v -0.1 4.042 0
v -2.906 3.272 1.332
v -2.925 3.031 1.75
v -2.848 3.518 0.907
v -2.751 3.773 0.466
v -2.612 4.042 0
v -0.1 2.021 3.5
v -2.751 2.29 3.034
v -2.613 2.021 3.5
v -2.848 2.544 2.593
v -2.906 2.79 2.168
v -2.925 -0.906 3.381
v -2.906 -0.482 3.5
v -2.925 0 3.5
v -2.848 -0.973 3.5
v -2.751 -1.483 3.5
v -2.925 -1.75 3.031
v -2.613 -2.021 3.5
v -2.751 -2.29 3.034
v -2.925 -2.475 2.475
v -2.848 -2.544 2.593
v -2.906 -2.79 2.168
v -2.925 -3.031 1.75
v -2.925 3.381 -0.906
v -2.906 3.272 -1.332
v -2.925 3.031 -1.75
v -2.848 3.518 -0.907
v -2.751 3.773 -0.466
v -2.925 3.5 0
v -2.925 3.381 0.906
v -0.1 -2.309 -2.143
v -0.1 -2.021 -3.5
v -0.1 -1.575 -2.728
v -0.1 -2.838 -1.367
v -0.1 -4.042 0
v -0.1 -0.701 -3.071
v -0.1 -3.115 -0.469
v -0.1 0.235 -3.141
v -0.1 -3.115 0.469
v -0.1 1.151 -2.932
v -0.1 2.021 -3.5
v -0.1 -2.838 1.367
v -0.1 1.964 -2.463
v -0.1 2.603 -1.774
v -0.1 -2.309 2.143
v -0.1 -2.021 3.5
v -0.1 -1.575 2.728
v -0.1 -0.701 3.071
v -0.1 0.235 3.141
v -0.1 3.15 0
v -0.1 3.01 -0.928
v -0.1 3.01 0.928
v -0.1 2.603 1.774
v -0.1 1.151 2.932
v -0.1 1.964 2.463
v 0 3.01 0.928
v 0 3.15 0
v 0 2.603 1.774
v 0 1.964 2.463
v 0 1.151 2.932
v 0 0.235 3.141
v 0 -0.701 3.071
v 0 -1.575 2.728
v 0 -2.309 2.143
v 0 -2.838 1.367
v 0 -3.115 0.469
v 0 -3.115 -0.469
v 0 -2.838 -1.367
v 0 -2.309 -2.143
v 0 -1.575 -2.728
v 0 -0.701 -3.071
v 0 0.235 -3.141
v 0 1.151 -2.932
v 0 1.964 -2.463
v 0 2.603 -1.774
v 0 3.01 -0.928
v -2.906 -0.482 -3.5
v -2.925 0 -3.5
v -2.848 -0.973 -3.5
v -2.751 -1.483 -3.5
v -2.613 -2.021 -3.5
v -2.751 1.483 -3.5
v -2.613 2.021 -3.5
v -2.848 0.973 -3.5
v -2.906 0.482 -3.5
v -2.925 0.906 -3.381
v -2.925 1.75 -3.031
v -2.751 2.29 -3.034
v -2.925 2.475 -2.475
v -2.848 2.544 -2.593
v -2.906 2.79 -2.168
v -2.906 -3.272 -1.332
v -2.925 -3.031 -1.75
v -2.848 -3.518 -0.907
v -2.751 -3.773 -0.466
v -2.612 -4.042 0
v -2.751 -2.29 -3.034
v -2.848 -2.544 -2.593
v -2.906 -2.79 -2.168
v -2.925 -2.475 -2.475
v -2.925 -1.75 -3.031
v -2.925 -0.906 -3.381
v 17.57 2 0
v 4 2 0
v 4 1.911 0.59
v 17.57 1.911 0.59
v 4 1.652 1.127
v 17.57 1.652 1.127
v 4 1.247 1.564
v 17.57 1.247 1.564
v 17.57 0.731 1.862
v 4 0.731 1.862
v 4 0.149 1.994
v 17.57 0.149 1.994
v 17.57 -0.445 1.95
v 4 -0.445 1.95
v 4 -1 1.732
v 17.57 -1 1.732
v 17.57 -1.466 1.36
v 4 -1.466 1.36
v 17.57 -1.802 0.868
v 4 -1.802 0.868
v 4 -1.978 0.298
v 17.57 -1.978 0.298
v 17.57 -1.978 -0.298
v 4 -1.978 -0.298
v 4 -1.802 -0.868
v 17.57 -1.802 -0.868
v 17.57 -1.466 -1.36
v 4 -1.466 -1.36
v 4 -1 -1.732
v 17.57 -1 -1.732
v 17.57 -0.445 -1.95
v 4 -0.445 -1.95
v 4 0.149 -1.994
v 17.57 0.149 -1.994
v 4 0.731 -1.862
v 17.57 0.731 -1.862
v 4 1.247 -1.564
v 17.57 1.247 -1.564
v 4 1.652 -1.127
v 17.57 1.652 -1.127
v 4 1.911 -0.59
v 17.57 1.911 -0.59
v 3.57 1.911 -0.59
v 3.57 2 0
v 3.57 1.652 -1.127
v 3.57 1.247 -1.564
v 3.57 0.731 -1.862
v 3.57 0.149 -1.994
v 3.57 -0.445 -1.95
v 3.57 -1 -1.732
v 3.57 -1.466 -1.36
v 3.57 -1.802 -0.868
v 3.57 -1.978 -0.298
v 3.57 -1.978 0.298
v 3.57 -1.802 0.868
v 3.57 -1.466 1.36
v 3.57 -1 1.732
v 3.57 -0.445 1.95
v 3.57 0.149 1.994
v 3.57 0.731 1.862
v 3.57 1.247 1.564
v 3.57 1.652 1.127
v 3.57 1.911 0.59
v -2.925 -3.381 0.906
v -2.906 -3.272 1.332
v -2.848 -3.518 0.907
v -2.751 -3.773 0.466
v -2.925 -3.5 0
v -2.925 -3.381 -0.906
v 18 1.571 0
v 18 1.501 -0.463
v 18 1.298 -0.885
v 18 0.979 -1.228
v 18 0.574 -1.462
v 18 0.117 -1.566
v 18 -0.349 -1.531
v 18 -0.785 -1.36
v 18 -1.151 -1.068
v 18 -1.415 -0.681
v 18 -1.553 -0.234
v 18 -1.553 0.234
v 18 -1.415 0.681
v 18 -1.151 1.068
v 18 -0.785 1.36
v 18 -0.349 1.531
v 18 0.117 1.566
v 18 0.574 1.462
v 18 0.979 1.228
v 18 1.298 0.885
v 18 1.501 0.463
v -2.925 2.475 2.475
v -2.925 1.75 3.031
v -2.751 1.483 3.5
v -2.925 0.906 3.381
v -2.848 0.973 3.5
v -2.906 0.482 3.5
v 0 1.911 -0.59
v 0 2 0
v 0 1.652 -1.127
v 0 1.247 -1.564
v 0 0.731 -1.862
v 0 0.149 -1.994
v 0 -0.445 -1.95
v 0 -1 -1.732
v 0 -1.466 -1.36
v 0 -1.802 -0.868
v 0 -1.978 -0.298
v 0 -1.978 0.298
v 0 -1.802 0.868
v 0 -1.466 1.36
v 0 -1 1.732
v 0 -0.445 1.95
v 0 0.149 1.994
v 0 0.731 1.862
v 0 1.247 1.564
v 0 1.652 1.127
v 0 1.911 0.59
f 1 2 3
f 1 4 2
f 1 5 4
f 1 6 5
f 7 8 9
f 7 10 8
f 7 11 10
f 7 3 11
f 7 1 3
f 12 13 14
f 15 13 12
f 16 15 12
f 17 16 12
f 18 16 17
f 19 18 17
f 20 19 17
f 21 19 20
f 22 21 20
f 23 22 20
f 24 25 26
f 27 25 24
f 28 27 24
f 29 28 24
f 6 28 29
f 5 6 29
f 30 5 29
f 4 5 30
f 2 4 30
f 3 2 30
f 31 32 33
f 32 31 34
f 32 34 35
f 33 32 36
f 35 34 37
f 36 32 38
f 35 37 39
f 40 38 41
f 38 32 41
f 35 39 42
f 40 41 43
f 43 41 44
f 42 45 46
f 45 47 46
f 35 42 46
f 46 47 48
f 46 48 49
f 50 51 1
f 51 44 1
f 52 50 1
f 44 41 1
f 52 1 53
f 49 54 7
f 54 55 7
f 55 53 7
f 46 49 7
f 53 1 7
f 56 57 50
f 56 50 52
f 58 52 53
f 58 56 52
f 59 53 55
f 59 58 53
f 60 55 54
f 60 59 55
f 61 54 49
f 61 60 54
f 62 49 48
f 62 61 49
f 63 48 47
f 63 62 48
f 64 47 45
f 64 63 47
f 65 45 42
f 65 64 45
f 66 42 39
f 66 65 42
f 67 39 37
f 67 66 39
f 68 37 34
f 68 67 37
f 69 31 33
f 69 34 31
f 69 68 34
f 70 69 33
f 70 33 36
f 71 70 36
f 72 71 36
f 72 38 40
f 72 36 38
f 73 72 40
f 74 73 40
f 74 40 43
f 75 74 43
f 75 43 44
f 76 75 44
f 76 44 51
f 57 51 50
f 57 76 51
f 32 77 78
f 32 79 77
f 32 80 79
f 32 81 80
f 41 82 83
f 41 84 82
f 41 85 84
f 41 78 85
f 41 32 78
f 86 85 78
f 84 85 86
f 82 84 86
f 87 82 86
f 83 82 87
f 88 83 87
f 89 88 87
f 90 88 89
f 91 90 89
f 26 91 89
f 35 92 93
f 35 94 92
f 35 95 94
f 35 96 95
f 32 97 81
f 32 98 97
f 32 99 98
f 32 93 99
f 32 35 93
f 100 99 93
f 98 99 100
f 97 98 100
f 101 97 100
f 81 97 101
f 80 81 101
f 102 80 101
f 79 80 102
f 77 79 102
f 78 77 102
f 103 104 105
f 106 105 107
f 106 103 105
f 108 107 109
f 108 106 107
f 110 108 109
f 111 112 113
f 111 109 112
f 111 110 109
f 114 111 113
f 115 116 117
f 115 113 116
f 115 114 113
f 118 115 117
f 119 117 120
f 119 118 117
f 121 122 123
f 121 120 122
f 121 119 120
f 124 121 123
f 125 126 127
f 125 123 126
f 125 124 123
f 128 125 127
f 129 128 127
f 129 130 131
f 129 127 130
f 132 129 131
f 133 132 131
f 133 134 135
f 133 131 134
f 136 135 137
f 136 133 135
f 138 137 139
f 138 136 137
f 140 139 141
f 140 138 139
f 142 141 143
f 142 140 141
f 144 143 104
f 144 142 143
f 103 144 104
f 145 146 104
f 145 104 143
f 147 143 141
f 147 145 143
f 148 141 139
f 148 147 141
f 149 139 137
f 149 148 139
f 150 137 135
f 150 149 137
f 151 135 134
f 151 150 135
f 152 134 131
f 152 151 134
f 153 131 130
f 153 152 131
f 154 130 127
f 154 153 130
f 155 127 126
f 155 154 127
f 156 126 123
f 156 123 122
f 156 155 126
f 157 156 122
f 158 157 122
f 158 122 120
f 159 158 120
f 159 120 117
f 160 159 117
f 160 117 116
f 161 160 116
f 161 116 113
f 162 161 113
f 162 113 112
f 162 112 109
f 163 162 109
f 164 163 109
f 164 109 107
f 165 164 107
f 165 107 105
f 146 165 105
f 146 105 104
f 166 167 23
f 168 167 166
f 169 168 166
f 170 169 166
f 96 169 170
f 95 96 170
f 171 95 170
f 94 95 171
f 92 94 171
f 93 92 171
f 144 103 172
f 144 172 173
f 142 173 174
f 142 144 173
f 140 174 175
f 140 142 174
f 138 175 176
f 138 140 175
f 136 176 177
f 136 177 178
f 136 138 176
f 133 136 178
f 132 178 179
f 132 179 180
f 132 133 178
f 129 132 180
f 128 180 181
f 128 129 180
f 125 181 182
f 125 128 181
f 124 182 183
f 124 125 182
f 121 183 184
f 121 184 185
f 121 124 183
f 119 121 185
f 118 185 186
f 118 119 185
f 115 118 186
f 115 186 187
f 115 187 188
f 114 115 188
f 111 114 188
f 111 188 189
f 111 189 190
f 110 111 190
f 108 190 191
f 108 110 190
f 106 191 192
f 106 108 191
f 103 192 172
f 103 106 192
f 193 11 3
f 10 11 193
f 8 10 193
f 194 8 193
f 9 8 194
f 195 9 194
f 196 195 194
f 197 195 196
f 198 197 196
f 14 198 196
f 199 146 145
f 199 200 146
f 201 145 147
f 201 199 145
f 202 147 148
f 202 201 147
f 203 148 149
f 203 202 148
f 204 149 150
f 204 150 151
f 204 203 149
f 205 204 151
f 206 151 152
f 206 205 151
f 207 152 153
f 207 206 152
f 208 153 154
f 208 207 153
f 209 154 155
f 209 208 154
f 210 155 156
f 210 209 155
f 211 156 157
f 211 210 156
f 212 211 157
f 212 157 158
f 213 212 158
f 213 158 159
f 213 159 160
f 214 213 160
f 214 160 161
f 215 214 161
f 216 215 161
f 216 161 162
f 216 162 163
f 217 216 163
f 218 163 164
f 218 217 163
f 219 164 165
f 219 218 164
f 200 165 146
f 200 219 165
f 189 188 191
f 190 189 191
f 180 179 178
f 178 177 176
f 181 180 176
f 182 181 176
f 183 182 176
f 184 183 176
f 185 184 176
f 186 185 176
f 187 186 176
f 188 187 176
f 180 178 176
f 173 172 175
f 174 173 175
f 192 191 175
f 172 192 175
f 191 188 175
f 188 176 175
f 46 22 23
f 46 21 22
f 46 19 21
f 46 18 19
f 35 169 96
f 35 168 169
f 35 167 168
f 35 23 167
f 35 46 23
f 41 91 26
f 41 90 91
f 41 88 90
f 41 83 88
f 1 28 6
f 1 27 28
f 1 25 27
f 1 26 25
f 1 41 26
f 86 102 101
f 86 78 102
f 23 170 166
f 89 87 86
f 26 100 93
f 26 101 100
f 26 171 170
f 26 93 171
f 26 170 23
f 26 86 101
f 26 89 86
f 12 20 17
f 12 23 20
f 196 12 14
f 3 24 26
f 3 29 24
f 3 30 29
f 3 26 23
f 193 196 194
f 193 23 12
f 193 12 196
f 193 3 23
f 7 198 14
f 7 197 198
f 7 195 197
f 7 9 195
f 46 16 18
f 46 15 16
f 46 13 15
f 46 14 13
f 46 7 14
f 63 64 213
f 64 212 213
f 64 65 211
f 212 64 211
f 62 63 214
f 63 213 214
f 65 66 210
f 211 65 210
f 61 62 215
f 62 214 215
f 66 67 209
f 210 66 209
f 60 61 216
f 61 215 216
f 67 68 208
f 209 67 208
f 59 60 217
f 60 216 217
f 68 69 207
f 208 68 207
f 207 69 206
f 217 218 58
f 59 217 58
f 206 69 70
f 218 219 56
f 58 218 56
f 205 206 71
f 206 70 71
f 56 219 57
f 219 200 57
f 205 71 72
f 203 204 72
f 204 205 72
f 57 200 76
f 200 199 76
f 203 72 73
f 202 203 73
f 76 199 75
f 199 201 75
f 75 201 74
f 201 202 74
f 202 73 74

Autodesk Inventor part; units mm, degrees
ref_plane "YZ Plane" through (0, 0, 0) normal (1, 0, 0) x (0, 1, 0)
ref_plane "XZ Plane" through (0, 0, 0) normal (0, 1, 0) x (-1, 0, 0)
sketch "Szkic1" plane through (0, 0, 0) normal (0, 0, 1) x (1, 0, 0)
  line L0 (0, 3.15) -> (0, 2)
  line L1 (4, 2) -> (18, 2)
  line L2 (18, 2) -> (18, 0)
  line L3 (18, 0) -> (-0.1001, 0)
  line L4 (-3.7201, 0) -> (21.62, 0) projected
  line L5 (-0.1001, 0) -> (-0.1001, 3.15)
  line L6 (-0.1001, 3.15) -> (0, 3.15)
  line L7 (4, 2) -> (3.5705, 2)
  line L8 (3.5705, 2) -> (0, 2)
  line L9 (0, -0.63) -> (0, 3.78) projected
  dimension "d0" = 18
  dimension "d1" = 14
  dimension "d2" = 4
  dimension "d9" = 0.1001
  dimension "d10" = 6.3
  dimension "d13" = 0.4295
  dimension "d14" = 4
revolve "Bryła" add sketch "Szkic1" angle 360 about axis through (18, 0, 0) along (-1, 0, 0)
sketch "Szkic2" plane through (-0.1001, 0, 0) normal (-1, 0, 0) x (0, 0, 1)
  line L0 (0, 4.0415) -> (3.5, 2.0207)
  line L1 (3.5, 2.0207) -> (3.5, -2.0207)
  line L2 (3.5, -2.0207) -> (0, -4.0415)
  line L3 (0, -4.0415) -> (-3.5, -2.0207)
  line L4 (-3.5, -2.0207) -> (-3.5, 2.0207)
  line L5 (-3.5, 2.0207) -> (0, 4.0415)
  point P0 (0, 0)
  point P1 (0, 0)
  dimension "d11" = 7
extrude "Głowica" add sketch "Szkic2" along normal blind 2.825
sketch "Szkic4" plane through (0, 0, 0) normal (0, 0, 1) x (1, 0, 0)
  line L0 (-2.9251, 3.5) -> (-2.9251, 4.0415)
  line L1 (-2.9251, 4.0415) -> (-2.6125, 4.0415)
  line L2 (-2.6125, 4.0415) -> (-2.9251, 3.5)
  line L3 (-3.4901, 0) -> (0.4649, 0) projected
  line L4 (-0.1001, 4.0415) -> (-2.9251, 4.0415) projected
  line L5 (-2.9251, 2.0207) -> (-2.9251, 4.0415) projected
  dimension "d5" = 30
  dimension "d19" = 7
revolve "Faza1" cut sketch "Szkic4" angle 360 about axis through (-10, 0, 0) along (1, 0, 0)
thread "Gwint" size "M4x0.7" class "6g" standard "ISO Metric profile" length 14
chamfer "Faza2" distance 0.4294 distance2 0.4295 1 edges at (18, -2, 0) measured on face at (18, -0.499, 0.4421)
ref_plane "Work Plane1" through (1.525, 0, 0) normal (0, 0, 1) x (1, 0, 0)
equation "\"d0\" = NLG"
equation "\"d1\" = GEL"
equation "\"d2\" = GD"
equation "\"d10\" = SD2"
equation "\"d14\" = BDM"
equation "\"d11\" = SW"
equation "\"d3\" = KOH - SD"
equation "\"d5\" = ANG1"
equation "\"d19\" = SW0"
equation "\"d15\" = GEL"
equation "\"d6\" = -0.5 * SPD + 0.5 * GD"
equation "\"NLG\" = 18"
equation "\"GD\" = NND"
equation "\"BDM\" = NND"
equation "\"KOH\" = 2.925"
equation "\"GEL\" = 14"
equation "\"SW\" = 7"
equation "\"SW0\" = 7"
equation "\"SPD\" = NND - 1.2269 * PTC"
equation "\"SD2\" = 0.9 * SW"
equation "\"SD\" = 0.1"
equation "\"ANG1\" = 30deg"
equation "\"GAL\" = 0.61345 * PTC"
equation "\"GUL\" = 0.61345 * PTC"
equation "\"RR\" = 0.35"
equation "\"GD1\" = THREADDIA - 1.2269 * PTC"
equation "\"THREADDIA\" = 4"
equation "\"SDH\" = 6.55"
equation "\"TOA\" = 30deg"
equation "\"PTC\" = 0.7"
equation "\"NND\" = 4"
equation "\"E0\" = 1.155 * SW"
properties part number "BS 3692 - M4 x 18" material "Stal, miękka"
